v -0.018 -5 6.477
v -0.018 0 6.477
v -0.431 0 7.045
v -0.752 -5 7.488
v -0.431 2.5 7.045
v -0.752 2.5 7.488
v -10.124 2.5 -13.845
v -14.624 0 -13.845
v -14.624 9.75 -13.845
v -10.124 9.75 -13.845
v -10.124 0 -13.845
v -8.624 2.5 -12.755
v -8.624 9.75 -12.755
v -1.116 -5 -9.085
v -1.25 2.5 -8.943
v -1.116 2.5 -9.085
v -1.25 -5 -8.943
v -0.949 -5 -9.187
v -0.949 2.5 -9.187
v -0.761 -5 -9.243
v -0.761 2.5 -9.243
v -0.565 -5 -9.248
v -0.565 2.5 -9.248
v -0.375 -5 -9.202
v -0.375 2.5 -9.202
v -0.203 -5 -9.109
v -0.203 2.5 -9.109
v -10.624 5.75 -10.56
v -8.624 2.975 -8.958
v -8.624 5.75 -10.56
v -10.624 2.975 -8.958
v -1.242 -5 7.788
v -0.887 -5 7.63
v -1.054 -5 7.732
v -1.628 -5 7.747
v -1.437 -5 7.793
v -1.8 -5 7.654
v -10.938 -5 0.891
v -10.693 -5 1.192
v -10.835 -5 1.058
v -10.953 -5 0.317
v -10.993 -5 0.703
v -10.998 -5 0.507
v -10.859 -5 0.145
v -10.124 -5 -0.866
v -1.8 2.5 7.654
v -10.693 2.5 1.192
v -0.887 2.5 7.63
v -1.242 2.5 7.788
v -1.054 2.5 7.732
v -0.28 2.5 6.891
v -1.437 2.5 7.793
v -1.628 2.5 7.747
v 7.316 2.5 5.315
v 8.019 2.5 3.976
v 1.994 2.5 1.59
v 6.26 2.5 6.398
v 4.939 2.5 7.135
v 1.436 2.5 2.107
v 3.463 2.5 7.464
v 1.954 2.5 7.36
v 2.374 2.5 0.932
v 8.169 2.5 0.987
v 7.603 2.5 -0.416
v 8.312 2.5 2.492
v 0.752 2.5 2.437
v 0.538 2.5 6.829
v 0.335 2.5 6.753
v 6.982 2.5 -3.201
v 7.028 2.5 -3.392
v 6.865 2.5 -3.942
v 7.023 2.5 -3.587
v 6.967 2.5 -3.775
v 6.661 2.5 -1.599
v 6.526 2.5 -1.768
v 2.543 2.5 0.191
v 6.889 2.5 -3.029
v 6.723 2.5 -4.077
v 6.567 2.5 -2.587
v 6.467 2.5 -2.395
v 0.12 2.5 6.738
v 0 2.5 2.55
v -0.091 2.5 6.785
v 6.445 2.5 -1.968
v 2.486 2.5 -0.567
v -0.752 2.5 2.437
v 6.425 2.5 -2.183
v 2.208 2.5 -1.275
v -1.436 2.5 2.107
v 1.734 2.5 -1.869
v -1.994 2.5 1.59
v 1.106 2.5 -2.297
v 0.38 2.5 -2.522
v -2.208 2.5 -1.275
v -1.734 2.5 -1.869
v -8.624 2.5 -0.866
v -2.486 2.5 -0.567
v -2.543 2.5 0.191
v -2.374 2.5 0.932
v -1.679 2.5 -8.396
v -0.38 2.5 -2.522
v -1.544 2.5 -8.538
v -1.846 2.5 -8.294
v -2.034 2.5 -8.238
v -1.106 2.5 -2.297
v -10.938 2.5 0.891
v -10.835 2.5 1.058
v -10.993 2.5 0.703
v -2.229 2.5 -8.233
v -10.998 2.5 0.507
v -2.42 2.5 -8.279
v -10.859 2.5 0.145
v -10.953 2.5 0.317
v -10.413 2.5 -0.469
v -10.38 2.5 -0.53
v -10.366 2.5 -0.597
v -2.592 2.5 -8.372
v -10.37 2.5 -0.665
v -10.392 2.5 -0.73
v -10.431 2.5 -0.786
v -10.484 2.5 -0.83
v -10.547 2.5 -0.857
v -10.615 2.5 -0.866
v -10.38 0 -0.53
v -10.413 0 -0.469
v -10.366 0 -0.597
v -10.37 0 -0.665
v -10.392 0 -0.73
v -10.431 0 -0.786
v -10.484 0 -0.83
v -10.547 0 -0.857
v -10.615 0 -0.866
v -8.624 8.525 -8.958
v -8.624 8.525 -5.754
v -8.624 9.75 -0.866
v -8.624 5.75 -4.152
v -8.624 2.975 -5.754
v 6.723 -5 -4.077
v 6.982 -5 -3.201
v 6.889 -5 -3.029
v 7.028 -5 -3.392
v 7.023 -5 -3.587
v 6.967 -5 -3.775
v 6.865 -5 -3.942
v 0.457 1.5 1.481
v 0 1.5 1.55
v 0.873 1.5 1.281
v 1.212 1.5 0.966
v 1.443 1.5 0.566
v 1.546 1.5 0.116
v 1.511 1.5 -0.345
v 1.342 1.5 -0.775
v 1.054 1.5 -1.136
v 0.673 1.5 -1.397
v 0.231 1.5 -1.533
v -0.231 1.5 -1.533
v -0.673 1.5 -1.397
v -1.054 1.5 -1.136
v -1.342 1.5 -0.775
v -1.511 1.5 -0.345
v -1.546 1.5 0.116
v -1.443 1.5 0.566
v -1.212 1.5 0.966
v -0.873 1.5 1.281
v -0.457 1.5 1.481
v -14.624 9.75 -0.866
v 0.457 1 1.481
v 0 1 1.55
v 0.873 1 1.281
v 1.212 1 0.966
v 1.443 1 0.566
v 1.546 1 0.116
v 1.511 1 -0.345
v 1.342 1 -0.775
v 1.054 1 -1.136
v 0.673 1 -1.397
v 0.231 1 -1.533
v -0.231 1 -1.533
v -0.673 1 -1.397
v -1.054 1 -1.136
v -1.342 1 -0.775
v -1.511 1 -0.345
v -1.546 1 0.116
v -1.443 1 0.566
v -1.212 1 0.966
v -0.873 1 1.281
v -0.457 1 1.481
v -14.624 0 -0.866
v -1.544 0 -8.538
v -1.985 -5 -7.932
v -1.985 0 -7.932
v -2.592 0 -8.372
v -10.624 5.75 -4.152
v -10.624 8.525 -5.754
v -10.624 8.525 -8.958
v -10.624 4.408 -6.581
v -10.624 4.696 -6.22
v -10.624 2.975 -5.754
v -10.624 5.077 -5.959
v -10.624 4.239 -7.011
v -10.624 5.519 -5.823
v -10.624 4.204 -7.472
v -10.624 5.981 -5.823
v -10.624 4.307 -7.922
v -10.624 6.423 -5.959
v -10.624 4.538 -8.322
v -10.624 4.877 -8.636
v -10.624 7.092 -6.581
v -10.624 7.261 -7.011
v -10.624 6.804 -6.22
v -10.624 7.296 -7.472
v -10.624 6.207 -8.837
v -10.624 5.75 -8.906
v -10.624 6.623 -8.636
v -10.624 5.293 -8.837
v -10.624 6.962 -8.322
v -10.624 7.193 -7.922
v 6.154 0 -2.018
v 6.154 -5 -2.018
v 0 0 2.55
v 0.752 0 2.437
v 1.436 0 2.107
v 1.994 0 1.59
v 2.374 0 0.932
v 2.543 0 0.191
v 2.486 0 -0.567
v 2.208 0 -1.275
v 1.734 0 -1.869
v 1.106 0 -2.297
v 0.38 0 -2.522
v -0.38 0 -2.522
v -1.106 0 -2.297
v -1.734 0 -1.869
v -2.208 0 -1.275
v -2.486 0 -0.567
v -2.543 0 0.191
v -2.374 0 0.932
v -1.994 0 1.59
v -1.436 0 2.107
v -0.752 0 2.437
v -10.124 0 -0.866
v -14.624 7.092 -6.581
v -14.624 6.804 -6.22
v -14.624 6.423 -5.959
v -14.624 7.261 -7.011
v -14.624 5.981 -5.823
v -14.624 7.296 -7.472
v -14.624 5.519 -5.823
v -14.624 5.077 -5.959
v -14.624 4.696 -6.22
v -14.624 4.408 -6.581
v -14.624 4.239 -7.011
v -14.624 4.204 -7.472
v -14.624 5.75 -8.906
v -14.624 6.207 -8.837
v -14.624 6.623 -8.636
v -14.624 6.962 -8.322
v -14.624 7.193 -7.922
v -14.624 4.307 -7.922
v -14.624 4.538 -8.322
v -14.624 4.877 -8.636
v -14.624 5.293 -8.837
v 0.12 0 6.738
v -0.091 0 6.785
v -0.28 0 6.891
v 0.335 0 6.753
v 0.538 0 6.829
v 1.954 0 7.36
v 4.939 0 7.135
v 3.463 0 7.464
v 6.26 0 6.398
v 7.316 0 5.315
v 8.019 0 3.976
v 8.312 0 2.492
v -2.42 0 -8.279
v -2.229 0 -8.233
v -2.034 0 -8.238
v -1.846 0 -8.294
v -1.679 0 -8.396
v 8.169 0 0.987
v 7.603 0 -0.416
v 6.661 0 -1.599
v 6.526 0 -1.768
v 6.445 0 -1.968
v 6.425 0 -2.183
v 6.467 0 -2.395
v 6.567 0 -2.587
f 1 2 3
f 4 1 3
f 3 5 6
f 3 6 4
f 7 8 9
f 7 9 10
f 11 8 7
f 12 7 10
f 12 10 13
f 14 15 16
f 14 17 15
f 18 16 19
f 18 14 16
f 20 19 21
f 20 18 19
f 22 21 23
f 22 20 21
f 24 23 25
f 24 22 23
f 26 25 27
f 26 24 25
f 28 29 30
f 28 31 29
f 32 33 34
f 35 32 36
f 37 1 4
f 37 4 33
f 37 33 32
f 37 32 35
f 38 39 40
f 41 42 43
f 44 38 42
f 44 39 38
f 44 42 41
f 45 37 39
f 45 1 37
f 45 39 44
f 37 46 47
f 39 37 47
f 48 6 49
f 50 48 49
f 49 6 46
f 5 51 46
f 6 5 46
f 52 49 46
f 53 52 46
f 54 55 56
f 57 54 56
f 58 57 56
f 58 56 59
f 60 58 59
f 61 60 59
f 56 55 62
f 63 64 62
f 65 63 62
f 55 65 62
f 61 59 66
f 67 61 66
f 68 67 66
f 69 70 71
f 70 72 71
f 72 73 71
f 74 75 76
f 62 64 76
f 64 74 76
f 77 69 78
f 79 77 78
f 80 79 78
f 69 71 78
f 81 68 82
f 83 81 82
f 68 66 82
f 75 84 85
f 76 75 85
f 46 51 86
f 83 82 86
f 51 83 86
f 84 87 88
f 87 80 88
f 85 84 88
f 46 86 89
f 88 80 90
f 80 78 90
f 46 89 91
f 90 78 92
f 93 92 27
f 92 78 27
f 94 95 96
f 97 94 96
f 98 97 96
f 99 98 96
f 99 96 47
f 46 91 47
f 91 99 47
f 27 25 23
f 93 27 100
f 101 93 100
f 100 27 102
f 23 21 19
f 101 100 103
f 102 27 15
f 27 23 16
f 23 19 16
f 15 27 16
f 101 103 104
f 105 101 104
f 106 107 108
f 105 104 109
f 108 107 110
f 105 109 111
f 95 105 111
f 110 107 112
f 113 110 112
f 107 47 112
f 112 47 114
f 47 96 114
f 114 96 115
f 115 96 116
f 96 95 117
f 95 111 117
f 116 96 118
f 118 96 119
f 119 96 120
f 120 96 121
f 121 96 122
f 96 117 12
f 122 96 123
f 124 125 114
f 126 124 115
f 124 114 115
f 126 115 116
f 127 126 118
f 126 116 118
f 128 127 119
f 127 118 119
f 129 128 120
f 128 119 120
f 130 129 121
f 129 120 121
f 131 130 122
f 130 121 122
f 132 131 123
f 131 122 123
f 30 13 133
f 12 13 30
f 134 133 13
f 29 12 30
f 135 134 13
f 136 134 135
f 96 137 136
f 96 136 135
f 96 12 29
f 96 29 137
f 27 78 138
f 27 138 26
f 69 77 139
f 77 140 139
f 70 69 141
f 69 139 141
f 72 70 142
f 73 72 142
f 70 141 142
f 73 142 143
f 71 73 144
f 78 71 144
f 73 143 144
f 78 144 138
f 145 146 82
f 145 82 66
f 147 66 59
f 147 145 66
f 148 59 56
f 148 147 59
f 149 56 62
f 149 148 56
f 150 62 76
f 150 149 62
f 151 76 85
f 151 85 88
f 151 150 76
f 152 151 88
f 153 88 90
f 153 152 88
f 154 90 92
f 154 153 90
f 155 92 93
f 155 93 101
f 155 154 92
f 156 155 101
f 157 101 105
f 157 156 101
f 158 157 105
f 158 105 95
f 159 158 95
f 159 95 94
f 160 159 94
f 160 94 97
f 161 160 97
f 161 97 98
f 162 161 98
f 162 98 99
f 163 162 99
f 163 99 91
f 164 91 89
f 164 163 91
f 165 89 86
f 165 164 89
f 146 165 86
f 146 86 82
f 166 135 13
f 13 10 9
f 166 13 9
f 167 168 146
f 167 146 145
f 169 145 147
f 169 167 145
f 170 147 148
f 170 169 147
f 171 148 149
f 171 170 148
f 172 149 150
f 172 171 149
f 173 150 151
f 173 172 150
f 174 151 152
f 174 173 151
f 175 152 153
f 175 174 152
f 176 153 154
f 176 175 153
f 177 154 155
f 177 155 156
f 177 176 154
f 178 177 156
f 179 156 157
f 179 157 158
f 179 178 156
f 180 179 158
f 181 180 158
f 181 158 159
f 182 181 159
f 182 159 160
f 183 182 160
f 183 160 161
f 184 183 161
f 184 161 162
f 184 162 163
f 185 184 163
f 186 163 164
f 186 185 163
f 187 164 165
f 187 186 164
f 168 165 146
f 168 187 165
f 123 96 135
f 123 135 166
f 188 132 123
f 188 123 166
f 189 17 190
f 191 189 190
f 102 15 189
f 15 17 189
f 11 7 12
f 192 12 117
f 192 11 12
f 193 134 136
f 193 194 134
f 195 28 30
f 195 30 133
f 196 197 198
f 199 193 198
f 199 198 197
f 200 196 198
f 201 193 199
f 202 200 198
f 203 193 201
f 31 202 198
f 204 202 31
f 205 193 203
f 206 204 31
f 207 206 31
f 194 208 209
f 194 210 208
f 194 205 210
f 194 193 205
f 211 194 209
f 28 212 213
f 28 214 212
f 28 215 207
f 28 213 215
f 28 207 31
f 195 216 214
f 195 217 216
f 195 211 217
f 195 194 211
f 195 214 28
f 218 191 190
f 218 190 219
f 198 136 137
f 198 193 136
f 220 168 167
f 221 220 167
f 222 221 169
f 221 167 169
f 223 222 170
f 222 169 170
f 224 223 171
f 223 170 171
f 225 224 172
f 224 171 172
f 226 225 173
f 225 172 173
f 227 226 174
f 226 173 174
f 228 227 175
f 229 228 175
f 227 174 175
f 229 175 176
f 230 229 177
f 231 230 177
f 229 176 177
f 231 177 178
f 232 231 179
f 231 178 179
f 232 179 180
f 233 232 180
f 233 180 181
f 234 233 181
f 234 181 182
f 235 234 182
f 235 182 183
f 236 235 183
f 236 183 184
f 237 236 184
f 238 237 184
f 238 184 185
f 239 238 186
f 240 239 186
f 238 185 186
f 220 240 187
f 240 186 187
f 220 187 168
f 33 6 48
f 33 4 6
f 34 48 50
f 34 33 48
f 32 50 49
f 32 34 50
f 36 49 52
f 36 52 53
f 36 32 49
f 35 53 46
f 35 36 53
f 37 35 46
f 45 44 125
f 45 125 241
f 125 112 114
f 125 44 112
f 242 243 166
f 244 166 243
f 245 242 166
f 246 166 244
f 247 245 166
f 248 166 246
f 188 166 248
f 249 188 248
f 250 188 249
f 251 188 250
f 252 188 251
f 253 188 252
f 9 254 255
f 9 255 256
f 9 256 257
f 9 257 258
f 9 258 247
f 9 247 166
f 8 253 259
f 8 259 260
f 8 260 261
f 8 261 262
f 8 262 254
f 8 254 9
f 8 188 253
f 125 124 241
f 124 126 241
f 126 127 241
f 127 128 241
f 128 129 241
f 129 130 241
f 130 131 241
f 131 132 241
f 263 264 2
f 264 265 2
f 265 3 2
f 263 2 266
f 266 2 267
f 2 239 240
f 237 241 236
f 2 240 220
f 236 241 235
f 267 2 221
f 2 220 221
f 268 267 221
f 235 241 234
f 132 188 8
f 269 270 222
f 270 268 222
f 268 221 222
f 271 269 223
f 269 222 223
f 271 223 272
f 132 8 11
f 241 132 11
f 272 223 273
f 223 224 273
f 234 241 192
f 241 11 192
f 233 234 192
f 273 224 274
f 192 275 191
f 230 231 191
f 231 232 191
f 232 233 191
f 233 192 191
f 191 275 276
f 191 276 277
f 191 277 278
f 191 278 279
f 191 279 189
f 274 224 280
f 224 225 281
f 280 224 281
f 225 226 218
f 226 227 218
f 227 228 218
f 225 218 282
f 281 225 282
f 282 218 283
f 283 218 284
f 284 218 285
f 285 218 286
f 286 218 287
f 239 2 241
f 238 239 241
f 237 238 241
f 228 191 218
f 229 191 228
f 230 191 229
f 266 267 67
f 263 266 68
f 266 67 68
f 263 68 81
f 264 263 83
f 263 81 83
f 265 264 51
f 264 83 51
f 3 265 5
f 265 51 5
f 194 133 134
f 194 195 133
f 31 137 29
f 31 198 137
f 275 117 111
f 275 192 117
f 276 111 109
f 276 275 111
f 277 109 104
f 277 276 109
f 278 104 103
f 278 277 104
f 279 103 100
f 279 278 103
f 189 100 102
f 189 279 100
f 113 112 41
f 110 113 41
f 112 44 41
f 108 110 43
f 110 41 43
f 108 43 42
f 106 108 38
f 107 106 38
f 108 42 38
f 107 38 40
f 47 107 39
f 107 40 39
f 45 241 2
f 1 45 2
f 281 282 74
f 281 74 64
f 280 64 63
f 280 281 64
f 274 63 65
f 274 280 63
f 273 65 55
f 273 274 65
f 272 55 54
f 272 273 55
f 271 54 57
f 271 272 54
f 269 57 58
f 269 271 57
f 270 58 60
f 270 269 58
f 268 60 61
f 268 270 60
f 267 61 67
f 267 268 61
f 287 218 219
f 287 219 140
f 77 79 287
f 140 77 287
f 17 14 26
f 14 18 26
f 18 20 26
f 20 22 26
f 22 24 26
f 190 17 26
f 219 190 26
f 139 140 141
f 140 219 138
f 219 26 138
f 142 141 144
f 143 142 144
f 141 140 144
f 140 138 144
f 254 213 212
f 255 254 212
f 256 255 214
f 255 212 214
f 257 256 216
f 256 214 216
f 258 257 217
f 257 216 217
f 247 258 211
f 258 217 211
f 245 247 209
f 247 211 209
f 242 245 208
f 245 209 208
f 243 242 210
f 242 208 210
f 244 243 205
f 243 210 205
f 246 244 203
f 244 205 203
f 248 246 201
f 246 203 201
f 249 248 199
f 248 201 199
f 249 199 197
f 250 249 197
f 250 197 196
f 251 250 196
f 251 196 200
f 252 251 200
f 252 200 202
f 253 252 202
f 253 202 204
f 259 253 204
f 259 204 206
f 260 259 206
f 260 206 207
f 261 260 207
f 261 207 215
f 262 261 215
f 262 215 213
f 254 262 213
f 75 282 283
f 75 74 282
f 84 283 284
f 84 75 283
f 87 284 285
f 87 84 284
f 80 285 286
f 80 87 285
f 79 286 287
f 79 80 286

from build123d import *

# Parameters (mm, degrees)
SKETCH_1_R            = 1.55
EXTRUDE_514_DEPTH     = 2.5
EXTRUDE_START         = 2.5
EXTRUDE_981_DEPTH     = 7.5
SKETCH_3_W            = 4.5
SKETCH_3_H            = 12.978713764
EXTRUDE_1_DEPTH       = 9.75
CHAMFER_1_SIZE        = 1
FILLET_5_R            = 0.75
CUT_EXTRUDE_1_DEPTH   = 2
SKETCH_7_R            = 1.55
CUT_EXTRUDE_2_DEPTH   = 4.5
EXTRUDE_2642_DEPTH    = 7.25
CUT_EXTRUDE_1_2_DEPTH = 26.037686694
EXTRUDE_START_2       = 1.5
SKETCH_9_R            = 1.55
EXTRUDE_2_DEPTH       = 1.5
FILLET_6_R            = 0.25


with BuildPart() as part:
    # 草图1 → Extrude 514 (new body)
    with BuildSketch(Plane(origin=(0, 0, 0), x_dir=(1, 0, 0), z_dir=(0, 1, 0))):
        with BuildLine():
            Line((-10.1243866, 13.845154317), (6.15423406, 2.01804411))
            ThreePointArc((6.15423406, 2.01804411), (7.315700706, -5.315167685), (-0.017511089, -6.476634331))
            Line((-0.017511089, -6.476634331), (-10.1243866, 0.866440553))
            Line((-10.1243866, 0.866440553), (-10.1243866, 13.845154317))
        make_face()
        with Locations(Location((0, 0, 0), (0, 0, 270))):
            Circle(SKETCH_1_R, mode=Mode.SUBTRACT)
    extrude(amount=EXTRUDE_514_DEPTH)

    # 草图2 → Extrude 981 (add)
    with BuildSketch(Plane(origin=(0, 0, 0), x_dir=(1, 0, 0), z_dir=(0, 1, 0)).offset(EXTRUDE_START)):
        Polygon((-10.1243866, 0.866440553), (-0.017511089, -6.476634331), (-1.193081594, -8.09466832), (-11.299957105, -0.751593436), align=None)
        Polygon((7.329804565, 3.636078099), (-0.809505765, 9.549633202), (-1.98507627, 7.931599213), (6.15423406, 2.01804411), align=None)
    extrude(amount=-EXTRUDE_981_DEPTH)

    # 草图3 → 限位-1 (add)
    with BuildSketch(Plane(origin=(0, 0, 0), x_dir=(1, 0, 0), z_dir=(0, 1, 0))):
        with Locations((-12.3743866, 7.355797435)):
            Rectangle(SKETCH_3_W, SKETCH_3_H)
    extrude(amount=EXTRUDE_1_DEPTH)

    # 倒角1
    chamfer_1_edges = [part.edges().sort_by_distance(p)[0] for p in [
        (0, 0, -1.55),
        (0, 2.5, -1.55),
    ]]
    chamfer(chamfer_1_edges, length=CHAMFER_1_SIZE)

    # 圆角5
    fillet_5_edges = [part.edges().sort_by_distance(p)[0] for p in [
        (-1.193081594, -1.25, 8.09466832),
        (-11.299957105, -1.25, 0.751593436),
        (-1.98507627, 1.25, -7.931599213),
        (-0.809505765, -1.25, -9.549633202),
        (7.329804565, -1.25, -3.636078099),
        (-0.017511089, 1.25, 6.476634331),
        (6.15423406, 1.25, -2.01804411),
    ]]
    fillet(fillet_5_edges, radius=FILLET_5_R)

    # 草图5 → Cut-Extrude 1 (cut)
    with BuildSketch(Plane(origin=(-10.1243866, 0, 0), x_dir=(0, 0, -1), z_dir=(1, 0, 0))):
        Polygon((10.560091429, 5.75), (8.957944432, 8.525), (5.753650438, 8.525), (4.151503441, 5.75), (5.753650438, 2.975), (8.957944432, 2.975), align=None)
    extrude(amount=-CUT_EXTRUDE_1_DEPTH, mode=Mode.SUBTRACT)

    # 草图7 → 切除-拉伸2 (cut)
    with BuildSketch(Plane(origin=(-10.1243866, 0, 0), x_dir=(0, 0, -1), z_dir=(1, 0, 0))):
        with Locations((7.355797435, 5.75)):
            Circle(SKETCH_7_R)
    extrude(amount=-CUT_EXTRUDE_2_DEPTH, mode=Mode.SUBTRACT)

    # 草图8 → Extrude 2642 (add)
    with BuildSketch(Plane(origin=(0, 0, 0), x_dir=(1, 0, 0), z_dir=(0, 1, 0)).offset(EXTRUDE_START)):
        Polygon((-10.1243866, 13.845154317), (-8.6243866, 12.755340525), (-8.6243866, 0.866440553), (-10.1243866, 0.866440553), align=None)
    extrude(amount=EXTRUDE_2642_DEPTH)

    # 草图5<2> → Cut-Extrude 1 2 (cut, through all)
    with BuildSketch(Plane(origin=(-10.1243866, 0, 0), x_dir=(0, 0, -1), z_dir=(1, 0, 0))):
        Polygon((10.560091429, 5.75), (8.957944432, 8.525), (5.753650438, 8.525), (4.151503441, 5.75), (5.753650438, 2.975), (8.957944432, 2.975), align=None)
    extrude(amount=CUT_EXTRUDE_1_2_DEPTH, mode=Mode.SUBTRACT)

    # 草图9 → 结构补强螺母位-2 (add)
    with BuildSketch(Plane(origin=(-12.1243866, 0, 0), x_dir=(0, 0, -1), z_dir=(1, 0, 0)).offset(EXTRUDE_START_2)):
        Polygon((8.957944432, 2.975), (10.560091429, 5.75), (8.957944432, 8.525), (5.753650438, 8.525), (4.151503441, 5.75), (5.753650438, 2.975), align=None)
        with Locations((7.355797435, 5.75)):
            Circle(SKETCH_9_R, mode=Mode.SUBTRACT)
    extrude(amount=-EXTRUDE_2_DEPTH)

    # 圆角6
    fillet_6_edges = [part.edges().sort_by_distance(p)[0] for p in [
        (-10.1243866, 1.25, -0.866440553),
    ]]
    fillet(fillet_6_edges, radius=FILLET_6_R)


solid = part.part
